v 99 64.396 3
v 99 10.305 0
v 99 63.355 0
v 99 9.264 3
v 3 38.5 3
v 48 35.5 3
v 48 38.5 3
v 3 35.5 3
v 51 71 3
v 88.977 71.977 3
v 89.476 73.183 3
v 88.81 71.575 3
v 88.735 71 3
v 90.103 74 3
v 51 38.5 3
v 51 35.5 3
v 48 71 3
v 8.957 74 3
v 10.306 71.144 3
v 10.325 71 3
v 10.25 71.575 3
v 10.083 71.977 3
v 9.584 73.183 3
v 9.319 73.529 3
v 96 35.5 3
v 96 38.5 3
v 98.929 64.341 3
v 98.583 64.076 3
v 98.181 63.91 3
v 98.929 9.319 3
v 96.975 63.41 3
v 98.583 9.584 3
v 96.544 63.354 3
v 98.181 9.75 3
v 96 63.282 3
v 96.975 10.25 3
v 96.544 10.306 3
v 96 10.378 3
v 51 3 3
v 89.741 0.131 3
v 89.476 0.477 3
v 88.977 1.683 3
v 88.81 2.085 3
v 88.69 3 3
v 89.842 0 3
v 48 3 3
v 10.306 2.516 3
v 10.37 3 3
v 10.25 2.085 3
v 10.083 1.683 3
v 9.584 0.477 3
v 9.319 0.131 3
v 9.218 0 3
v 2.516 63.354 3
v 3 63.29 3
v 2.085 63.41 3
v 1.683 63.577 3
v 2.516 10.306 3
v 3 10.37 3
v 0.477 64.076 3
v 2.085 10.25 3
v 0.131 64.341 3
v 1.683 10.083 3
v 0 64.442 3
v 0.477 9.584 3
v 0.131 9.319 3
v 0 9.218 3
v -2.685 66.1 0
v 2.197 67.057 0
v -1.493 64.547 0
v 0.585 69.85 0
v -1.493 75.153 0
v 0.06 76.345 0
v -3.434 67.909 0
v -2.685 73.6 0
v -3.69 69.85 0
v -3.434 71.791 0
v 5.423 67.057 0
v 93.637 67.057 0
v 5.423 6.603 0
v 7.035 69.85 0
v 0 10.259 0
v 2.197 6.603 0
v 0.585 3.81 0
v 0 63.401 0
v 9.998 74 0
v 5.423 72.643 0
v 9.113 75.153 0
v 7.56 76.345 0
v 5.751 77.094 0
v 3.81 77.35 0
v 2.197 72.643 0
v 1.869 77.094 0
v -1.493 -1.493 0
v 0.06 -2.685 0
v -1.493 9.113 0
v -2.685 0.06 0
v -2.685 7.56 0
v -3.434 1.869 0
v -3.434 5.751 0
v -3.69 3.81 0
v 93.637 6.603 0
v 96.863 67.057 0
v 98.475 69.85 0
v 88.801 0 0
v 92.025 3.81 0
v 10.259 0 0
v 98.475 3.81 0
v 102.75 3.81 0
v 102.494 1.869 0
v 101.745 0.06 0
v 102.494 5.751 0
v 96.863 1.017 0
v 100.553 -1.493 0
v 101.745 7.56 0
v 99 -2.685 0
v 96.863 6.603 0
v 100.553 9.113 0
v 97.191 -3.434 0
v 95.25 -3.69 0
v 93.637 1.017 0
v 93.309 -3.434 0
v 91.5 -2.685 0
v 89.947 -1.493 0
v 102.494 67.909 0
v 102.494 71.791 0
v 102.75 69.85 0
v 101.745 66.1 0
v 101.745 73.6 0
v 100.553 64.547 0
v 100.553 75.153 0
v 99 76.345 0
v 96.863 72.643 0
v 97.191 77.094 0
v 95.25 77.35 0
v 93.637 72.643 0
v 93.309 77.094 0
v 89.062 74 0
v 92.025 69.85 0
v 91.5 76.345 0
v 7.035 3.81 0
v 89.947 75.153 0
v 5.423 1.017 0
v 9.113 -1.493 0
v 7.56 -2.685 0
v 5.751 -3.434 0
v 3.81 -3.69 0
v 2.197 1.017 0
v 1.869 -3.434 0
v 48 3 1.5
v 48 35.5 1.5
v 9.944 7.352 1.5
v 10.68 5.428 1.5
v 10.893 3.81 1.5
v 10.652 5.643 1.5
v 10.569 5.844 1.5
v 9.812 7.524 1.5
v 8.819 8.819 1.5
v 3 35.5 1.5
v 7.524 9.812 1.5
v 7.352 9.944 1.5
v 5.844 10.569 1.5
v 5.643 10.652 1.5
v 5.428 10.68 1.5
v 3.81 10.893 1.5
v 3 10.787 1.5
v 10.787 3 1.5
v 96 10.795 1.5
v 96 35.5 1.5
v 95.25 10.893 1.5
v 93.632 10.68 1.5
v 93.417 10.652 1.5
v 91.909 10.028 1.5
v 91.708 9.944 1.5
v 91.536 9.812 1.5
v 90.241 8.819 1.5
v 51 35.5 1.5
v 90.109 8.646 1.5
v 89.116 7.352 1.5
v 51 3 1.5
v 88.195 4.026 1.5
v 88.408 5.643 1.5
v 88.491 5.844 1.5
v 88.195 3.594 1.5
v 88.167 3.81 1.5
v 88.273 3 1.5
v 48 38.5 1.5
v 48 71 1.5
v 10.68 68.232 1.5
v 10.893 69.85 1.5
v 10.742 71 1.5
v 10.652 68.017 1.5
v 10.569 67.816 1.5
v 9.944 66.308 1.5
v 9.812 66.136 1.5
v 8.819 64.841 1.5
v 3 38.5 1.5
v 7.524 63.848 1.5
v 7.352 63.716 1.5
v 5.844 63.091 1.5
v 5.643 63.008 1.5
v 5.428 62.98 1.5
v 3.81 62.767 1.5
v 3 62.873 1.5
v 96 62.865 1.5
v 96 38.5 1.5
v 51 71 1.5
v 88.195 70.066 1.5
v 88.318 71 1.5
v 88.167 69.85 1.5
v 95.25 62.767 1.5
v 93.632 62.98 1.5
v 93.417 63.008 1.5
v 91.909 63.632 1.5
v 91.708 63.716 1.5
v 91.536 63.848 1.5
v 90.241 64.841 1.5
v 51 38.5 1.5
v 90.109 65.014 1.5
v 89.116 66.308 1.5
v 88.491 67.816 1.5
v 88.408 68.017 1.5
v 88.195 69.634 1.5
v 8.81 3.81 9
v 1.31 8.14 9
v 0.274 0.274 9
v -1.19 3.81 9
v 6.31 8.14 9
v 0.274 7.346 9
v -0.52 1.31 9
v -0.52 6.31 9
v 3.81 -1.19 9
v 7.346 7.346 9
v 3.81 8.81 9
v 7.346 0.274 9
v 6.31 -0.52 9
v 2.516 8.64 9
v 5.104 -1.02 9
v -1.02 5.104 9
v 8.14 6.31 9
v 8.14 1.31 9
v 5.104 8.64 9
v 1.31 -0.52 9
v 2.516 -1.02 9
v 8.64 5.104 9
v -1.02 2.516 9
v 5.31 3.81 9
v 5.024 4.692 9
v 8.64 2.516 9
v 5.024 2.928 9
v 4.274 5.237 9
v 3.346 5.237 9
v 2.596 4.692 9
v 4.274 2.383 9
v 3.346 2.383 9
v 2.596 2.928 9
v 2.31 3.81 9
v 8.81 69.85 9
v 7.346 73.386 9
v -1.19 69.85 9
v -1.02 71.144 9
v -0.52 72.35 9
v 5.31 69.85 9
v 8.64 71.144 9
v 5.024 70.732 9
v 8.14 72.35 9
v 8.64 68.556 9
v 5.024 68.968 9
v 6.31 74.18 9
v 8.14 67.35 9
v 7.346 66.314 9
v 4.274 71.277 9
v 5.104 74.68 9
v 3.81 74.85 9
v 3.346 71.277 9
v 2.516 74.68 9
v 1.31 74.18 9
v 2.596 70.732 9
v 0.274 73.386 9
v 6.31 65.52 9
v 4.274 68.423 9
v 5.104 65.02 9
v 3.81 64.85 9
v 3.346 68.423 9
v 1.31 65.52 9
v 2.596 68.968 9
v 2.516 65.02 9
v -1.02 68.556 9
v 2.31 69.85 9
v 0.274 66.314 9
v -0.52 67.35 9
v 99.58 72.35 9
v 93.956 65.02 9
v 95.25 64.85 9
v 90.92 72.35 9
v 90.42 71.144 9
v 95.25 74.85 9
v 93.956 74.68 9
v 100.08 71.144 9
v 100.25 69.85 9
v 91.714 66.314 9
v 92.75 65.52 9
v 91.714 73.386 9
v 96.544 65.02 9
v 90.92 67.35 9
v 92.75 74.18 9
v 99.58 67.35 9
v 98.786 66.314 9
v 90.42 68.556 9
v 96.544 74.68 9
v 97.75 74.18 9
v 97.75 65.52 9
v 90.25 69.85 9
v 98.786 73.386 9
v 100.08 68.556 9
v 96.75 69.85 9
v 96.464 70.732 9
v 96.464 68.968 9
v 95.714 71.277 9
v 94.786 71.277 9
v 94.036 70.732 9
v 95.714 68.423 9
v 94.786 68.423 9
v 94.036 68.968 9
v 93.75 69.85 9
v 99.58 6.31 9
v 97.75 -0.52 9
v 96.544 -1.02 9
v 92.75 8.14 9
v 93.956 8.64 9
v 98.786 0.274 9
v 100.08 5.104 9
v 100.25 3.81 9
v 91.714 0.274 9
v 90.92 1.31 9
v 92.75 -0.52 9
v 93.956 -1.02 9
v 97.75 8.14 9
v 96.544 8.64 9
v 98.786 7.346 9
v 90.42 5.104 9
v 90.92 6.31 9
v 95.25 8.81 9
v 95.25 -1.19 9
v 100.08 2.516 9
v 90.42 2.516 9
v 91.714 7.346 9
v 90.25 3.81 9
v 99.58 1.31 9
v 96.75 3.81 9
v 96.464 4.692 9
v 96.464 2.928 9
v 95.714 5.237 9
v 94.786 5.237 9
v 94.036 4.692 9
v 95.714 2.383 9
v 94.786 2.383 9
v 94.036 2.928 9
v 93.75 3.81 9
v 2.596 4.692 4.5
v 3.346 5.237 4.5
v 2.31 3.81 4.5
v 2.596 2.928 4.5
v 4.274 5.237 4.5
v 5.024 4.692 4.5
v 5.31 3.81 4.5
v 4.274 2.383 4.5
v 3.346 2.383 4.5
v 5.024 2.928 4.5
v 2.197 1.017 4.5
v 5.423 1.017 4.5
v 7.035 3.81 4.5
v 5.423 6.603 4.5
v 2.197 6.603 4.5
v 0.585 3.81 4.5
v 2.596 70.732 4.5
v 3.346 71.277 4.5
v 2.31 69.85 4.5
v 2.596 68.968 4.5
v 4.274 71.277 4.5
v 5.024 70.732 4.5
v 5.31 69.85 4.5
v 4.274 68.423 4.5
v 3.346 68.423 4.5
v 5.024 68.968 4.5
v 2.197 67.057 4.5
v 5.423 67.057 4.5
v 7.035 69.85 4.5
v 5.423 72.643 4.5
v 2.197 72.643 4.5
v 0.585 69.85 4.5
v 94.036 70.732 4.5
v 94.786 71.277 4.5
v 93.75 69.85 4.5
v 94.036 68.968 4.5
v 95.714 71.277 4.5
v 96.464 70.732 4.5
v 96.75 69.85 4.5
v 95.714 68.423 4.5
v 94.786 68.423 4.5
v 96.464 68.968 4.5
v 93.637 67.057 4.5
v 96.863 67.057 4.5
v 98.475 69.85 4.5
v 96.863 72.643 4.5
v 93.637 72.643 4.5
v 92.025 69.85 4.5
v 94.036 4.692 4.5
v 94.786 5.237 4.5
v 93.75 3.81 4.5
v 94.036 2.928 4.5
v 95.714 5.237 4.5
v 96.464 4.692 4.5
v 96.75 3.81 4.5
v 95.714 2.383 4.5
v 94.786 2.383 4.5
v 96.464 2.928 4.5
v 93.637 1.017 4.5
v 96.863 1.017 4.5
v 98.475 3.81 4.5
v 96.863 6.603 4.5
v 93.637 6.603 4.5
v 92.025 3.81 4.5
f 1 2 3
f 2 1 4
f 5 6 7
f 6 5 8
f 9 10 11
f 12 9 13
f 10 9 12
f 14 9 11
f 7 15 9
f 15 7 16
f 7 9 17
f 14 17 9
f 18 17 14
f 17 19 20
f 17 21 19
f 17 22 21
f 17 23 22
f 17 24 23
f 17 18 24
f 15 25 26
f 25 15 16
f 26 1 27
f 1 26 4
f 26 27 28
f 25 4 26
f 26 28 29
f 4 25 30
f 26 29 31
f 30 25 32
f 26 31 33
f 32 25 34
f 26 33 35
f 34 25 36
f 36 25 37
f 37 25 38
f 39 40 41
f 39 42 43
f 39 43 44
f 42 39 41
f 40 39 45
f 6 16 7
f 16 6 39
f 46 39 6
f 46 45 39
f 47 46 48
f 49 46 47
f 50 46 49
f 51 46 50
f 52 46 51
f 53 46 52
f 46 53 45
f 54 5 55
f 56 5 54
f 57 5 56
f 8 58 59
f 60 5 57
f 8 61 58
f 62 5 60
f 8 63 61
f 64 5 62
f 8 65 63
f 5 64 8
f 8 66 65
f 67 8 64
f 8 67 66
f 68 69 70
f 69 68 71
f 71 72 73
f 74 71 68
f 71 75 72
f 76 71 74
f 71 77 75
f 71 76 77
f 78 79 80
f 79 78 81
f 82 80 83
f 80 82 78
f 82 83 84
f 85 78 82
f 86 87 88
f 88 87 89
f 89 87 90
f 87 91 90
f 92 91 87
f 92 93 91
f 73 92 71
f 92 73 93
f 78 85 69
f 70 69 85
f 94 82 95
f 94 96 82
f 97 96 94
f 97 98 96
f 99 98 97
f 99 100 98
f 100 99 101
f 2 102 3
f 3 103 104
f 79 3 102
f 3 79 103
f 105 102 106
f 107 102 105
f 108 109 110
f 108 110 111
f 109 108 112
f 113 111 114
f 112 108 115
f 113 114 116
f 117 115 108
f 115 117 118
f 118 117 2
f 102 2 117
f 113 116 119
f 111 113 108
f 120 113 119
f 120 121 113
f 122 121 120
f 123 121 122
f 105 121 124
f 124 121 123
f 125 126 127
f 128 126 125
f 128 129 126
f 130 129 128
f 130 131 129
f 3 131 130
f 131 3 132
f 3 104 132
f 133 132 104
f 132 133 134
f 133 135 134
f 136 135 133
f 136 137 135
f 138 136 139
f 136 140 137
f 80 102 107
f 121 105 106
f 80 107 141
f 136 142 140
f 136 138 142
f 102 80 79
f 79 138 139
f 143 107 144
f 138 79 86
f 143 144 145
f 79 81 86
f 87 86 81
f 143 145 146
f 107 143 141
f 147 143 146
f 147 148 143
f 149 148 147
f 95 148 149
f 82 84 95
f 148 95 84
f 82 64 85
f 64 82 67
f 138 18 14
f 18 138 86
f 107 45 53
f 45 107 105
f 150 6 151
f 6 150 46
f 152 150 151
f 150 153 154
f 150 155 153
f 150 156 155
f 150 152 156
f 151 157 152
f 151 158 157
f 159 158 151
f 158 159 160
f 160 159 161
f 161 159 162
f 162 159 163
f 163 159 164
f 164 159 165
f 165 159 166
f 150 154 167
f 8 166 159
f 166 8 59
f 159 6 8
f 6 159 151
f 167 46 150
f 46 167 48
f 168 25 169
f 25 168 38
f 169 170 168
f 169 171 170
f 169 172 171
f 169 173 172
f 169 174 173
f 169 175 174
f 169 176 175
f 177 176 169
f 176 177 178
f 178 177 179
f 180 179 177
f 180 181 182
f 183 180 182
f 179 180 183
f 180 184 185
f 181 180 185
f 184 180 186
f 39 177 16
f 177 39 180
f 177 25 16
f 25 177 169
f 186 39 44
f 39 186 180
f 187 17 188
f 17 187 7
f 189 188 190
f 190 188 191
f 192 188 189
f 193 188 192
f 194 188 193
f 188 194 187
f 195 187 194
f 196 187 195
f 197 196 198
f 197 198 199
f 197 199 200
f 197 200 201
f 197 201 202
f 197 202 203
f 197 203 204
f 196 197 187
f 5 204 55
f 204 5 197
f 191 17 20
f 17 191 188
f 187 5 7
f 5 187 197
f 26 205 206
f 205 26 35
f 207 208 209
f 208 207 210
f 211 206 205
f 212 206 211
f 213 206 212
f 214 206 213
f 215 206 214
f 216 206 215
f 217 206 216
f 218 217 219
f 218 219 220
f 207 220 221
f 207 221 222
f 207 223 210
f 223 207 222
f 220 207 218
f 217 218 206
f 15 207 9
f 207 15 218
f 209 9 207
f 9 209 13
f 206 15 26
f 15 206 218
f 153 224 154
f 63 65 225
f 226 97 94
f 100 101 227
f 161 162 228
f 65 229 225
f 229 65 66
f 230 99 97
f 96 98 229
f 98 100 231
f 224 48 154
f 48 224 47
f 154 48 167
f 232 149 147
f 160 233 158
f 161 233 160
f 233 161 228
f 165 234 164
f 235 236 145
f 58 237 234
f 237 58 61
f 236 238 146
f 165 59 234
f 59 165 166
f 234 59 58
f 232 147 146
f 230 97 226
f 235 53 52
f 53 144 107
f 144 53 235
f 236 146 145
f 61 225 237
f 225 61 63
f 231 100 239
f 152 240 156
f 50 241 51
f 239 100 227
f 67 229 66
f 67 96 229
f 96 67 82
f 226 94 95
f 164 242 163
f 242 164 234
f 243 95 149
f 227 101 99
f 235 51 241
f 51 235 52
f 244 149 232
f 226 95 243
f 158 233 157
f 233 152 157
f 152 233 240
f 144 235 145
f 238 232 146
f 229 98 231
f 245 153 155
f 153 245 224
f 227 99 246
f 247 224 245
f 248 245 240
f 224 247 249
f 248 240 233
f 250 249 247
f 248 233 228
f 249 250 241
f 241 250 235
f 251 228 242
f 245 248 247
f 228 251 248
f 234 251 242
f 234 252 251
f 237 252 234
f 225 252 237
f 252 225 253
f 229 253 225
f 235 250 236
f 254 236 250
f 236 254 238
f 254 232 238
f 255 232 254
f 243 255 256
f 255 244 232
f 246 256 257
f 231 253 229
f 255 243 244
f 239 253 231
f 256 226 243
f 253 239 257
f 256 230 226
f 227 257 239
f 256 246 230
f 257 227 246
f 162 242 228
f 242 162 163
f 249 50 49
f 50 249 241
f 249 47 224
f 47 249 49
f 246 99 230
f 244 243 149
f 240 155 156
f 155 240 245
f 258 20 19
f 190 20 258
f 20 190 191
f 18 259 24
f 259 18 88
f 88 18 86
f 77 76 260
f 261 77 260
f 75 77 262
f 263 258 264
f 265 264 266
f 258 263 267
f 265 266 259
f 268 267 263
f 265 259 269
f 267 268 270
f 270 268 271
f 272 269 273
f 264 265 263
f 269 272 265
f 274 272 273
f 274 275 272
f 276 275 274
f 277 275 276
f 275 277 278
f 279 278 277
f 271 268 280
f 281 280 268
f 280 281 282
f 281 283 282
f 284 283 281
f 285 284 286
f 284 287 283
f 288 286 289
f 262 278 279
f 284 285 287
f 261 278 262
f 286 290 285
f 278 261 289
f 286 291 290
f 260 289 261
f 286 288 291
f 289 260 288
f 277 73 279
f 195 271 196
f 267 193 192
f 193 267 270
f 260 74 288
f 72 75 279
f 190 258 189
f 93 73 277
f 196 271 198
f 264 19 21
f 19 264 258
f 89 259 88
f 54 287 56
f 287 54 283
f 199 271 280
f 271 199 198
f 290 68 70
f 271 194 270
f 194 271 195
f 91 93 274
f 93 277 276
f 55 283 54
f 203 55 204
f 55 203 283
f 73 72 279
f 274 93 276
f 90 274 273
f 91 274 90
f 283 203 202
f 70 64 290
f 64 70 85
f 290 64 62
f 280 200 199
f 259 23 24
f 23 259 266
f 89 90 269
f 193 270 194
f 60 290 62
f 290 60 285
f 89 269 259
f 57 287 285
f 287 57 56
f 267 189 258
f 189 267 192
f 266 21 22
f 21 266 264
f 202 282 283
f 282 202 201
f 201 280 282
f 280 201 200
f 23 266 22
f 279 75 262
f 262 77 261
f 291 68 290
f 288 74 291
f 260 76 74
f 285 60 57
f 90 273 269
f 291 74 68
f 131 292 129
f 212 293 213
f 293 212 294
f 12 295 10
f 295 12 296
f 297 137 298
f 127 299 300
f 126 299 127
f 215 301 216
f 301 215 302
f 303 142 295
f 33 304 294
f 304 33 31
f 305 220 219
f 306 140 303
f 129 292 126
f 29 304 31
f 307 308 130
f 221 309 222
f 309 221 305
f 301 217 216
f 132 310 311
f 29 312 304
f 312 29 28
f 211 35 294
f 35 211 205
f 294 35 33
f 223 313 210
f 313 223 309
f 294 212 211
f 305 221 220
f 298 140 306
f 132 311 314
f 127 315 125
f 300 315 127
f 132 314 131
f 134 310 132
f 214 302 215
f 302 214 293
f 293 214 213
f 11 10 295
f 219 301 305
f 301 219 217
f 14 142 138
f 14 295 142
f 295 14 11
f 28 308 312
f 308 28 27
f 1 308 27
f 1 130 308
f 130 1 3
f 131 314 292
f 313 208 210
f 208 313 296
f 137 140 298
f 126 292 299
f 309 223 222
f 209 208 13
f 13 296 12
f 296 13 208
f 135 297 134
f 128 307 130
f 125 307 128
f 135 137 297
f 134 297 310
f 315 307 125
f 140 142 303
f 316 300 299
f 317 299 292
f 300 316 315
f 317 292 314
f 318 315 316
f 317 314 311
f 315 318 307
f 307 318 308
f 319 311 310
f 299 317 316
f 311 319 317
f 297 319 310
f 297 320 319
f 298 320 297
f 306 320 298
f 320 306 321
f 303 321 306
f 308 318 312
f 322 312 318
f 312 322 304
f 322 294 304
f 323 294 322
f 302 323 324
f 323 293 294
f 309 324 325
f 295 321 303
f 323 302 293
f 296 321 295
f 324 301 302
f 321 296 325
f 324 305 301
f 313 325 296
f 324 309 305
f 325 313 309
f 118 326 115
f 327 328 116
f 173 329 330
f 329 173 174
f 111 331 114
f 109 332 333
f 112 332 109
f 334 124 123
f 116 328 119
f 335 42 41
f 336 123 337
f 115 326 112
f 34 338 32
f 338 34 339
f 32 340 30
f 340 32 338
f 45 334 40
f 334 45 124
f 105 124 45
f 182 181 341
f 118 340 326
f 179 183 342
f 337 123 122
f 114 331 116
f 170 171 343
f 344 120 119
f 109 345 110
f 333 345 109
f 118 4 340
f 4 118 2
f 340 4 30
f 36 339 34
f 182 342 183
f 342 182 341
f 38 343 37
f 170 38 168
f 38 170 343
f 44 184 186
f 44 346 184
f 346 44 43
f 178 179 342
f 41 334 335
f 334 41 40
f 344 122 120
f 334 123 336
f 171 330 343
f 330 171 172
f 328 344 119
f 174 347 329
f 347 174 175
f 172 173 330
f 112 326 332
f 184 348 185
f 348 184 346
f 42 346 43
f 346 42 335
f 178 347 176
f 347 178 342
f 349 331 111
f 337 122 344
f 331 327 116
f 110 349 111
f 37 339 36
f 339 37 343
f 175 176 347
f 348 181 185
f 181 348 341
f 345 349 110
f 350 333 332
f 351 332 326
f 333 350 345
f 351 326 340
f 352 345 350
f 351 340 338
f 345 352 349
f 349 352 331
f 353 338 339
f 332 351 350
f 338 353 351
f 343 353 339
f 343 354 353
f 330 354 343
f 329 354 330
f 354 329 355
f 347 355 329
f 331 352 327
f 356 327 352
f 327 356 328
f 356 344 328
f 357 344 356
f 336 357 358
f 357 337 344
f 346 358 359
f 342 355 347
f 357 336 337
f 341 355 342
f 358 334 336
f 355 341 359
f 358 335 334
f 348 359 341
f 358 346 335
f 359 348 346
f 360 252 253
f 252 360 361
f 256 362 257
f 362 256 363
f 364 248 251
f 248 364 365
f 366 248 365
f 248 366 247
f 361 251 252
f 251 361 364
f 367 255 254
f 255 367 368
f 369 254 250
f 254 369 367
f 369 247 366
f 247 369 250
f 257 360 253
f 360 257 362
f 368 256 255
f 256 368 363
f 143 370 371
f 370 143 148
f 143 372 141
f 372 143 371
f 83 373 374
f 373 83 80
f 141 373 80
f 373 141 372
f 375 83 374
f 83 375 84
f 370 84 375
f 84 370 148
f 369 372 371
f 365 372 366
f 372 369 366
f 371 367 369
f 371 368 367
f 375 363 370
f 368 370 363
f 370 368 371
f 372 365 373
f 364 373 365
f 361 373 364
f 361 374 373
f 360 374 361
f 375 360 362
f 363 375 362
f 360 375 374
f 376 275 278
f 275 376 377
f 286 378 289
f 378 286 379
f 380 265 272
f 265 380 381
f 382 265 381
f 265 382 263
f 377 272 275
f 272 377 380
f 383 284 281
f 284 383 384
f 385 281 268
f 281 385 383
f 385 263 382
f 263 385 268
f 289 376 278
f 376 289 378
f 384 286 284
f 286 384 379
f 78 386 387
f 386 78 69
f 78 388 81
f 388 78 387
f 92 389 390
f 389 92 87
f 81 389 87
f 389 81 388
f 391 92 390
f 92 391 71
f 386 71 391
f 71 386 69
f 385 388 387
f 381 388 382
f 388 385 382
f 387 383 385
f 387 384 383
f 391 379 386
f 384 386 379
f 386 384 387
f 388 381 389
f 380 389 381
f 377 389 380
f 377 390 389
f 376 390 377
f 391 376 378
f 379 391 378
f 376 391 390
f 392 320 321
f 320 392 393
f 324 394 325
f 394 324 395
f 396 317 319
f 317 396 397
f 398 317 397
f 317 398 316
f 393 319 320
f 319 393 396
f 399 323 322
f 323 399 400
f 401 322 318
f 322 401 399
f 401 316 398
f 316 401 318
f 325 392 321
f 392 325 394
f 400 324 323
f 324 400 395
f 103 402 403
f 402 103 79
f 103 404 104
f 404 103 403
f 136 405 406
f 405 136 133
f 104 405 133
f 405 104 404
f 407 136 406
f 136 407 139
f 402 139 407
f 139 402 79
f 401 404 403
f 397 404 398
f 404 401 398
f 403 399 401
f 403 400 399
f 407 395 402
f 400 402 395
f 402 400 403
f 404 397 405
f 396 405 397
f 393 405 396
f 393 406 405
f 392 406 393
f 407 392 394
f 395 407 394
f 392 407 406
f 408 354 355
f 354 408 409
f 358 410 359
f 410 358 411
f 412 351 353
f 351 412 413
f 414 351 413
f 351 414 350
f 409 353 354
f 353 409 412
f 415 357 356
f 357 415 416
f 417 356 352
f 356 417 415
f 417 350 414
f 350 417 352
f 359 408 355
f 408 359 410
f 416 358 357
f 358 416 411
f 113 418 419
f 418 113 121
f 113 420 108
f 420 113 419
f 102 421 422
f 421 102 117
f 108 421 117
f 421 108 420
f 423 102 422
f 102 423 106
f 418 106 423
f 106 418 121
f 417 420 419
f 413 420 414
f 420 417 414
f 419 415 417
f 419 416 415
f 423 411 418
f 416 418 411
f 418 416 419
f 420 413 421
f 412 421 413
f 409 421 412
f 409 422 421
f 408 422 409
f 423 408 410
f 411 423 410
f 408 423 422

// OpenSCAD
/*
Mounting plate for the Minnowboard MAX
*/

// Minnowboard MAX dimentions
mbmax_w = 99;
mbmax_d = 74;
wall = 3;
thin_wall = 1.5;

w = mbmax_w;
d = mbmax_d;

// Bottom of motherboard from base
// 6mm for the Minnowboard (which has a connector sticking 4.25mm down)
// Minnowboard has a 5177985-2  5H connector
// http://datasheet.octopart.com/5177985-2-Tyco-Electronics-datasheet-528420.pdf
// page 9: height is 3.75+0.5mm = 4.25mm
height_mb = wall + 6;

module m3_nut_trap() {
	cylinder(r = 5.5 / 2 / cos(180 / 6) + 0.05, $fn=6, h=4.5);
}

module mountinghole(x, y, generate_holes) {
    translate([x,y,0]) {
        if (generate_holes) {
			union() {
				cylinder(h=20, d=3, $fn=10);
				m3_nut_trap();
			}
		} else {
			cylinder(h=height_mb, d1=15, d2=10);
		}
    }
}


module minnowboard_max(generate_holes) {
    if (!generate_holes) {
        // Visualise the location of the 6motherboard
//        //translate([0,0, height_mb])
        //% cube([mbmax_w, mbmax_d, 20]);
    }
    // From 80101_0125_F200_ThruHolePlated.ncd
    // Diameter = 0.156" = 4mm
    mountinghole(0.15 * 25.4, 0.15 * 25.4, generate_holes);  // Location: (0.15, 0.15)
    mountinghole(0.15 * 25.4, 2.75 * 25.4, generate_holes);  // Location: (0.15, 2.75)
    mountinghole(3.75 * 25.4, 2.75 * 25.4, generate_holes);  // Location: (3.75, 2.75)
    mountinghole(3.75 * 25.4, 0.15 * 25.4, generate_holes);  // Location: (3.75, 0.15)
}

frame = 3;

module case() {

	difference () {
		union () {
			difference() {
				cube([w, d, wall]);
                translate([frame, frame, thin_wall]) 
                    cube([(w-frame*3)/2, (d-frame*3)/2, wall]);
                translate([(frame + w)/2, frame, thin_wall]) 
                    cube([(w-frame*3)/2, (d-frame*3)/2, wall]);
                translate([frame, (frame+d)/2, thin_wall]) 
                    cube([(w-frame*3)/2, (d-frame*3)/2, wall]);
                translate([(frame + w)/2, (frame+d)/2, thin_wall]) 
                    cube([(w-frame*3)/2, (d-frame*3)/2, wall]);
			}
            translate([(w-mbmax_w)/2, (d-mbmax_d)/2, 0]) minnowboard_max(false);
            
         
		}
        translate([(w-mbmax_w)/2, (d-mbmax_d)/2, 0]) minnowboard_max(true);
	}
}

module printable() {
    case();
}

module slice_y() {
	intersection() {
		case();
		translate([w/2,-500,-500]) cube([1000,1000,1000]);
	}
}

module slice_z() {
	projection(cut=true) translate([0,0,-wall/2]) case();
}

printable();
//slice_z();
